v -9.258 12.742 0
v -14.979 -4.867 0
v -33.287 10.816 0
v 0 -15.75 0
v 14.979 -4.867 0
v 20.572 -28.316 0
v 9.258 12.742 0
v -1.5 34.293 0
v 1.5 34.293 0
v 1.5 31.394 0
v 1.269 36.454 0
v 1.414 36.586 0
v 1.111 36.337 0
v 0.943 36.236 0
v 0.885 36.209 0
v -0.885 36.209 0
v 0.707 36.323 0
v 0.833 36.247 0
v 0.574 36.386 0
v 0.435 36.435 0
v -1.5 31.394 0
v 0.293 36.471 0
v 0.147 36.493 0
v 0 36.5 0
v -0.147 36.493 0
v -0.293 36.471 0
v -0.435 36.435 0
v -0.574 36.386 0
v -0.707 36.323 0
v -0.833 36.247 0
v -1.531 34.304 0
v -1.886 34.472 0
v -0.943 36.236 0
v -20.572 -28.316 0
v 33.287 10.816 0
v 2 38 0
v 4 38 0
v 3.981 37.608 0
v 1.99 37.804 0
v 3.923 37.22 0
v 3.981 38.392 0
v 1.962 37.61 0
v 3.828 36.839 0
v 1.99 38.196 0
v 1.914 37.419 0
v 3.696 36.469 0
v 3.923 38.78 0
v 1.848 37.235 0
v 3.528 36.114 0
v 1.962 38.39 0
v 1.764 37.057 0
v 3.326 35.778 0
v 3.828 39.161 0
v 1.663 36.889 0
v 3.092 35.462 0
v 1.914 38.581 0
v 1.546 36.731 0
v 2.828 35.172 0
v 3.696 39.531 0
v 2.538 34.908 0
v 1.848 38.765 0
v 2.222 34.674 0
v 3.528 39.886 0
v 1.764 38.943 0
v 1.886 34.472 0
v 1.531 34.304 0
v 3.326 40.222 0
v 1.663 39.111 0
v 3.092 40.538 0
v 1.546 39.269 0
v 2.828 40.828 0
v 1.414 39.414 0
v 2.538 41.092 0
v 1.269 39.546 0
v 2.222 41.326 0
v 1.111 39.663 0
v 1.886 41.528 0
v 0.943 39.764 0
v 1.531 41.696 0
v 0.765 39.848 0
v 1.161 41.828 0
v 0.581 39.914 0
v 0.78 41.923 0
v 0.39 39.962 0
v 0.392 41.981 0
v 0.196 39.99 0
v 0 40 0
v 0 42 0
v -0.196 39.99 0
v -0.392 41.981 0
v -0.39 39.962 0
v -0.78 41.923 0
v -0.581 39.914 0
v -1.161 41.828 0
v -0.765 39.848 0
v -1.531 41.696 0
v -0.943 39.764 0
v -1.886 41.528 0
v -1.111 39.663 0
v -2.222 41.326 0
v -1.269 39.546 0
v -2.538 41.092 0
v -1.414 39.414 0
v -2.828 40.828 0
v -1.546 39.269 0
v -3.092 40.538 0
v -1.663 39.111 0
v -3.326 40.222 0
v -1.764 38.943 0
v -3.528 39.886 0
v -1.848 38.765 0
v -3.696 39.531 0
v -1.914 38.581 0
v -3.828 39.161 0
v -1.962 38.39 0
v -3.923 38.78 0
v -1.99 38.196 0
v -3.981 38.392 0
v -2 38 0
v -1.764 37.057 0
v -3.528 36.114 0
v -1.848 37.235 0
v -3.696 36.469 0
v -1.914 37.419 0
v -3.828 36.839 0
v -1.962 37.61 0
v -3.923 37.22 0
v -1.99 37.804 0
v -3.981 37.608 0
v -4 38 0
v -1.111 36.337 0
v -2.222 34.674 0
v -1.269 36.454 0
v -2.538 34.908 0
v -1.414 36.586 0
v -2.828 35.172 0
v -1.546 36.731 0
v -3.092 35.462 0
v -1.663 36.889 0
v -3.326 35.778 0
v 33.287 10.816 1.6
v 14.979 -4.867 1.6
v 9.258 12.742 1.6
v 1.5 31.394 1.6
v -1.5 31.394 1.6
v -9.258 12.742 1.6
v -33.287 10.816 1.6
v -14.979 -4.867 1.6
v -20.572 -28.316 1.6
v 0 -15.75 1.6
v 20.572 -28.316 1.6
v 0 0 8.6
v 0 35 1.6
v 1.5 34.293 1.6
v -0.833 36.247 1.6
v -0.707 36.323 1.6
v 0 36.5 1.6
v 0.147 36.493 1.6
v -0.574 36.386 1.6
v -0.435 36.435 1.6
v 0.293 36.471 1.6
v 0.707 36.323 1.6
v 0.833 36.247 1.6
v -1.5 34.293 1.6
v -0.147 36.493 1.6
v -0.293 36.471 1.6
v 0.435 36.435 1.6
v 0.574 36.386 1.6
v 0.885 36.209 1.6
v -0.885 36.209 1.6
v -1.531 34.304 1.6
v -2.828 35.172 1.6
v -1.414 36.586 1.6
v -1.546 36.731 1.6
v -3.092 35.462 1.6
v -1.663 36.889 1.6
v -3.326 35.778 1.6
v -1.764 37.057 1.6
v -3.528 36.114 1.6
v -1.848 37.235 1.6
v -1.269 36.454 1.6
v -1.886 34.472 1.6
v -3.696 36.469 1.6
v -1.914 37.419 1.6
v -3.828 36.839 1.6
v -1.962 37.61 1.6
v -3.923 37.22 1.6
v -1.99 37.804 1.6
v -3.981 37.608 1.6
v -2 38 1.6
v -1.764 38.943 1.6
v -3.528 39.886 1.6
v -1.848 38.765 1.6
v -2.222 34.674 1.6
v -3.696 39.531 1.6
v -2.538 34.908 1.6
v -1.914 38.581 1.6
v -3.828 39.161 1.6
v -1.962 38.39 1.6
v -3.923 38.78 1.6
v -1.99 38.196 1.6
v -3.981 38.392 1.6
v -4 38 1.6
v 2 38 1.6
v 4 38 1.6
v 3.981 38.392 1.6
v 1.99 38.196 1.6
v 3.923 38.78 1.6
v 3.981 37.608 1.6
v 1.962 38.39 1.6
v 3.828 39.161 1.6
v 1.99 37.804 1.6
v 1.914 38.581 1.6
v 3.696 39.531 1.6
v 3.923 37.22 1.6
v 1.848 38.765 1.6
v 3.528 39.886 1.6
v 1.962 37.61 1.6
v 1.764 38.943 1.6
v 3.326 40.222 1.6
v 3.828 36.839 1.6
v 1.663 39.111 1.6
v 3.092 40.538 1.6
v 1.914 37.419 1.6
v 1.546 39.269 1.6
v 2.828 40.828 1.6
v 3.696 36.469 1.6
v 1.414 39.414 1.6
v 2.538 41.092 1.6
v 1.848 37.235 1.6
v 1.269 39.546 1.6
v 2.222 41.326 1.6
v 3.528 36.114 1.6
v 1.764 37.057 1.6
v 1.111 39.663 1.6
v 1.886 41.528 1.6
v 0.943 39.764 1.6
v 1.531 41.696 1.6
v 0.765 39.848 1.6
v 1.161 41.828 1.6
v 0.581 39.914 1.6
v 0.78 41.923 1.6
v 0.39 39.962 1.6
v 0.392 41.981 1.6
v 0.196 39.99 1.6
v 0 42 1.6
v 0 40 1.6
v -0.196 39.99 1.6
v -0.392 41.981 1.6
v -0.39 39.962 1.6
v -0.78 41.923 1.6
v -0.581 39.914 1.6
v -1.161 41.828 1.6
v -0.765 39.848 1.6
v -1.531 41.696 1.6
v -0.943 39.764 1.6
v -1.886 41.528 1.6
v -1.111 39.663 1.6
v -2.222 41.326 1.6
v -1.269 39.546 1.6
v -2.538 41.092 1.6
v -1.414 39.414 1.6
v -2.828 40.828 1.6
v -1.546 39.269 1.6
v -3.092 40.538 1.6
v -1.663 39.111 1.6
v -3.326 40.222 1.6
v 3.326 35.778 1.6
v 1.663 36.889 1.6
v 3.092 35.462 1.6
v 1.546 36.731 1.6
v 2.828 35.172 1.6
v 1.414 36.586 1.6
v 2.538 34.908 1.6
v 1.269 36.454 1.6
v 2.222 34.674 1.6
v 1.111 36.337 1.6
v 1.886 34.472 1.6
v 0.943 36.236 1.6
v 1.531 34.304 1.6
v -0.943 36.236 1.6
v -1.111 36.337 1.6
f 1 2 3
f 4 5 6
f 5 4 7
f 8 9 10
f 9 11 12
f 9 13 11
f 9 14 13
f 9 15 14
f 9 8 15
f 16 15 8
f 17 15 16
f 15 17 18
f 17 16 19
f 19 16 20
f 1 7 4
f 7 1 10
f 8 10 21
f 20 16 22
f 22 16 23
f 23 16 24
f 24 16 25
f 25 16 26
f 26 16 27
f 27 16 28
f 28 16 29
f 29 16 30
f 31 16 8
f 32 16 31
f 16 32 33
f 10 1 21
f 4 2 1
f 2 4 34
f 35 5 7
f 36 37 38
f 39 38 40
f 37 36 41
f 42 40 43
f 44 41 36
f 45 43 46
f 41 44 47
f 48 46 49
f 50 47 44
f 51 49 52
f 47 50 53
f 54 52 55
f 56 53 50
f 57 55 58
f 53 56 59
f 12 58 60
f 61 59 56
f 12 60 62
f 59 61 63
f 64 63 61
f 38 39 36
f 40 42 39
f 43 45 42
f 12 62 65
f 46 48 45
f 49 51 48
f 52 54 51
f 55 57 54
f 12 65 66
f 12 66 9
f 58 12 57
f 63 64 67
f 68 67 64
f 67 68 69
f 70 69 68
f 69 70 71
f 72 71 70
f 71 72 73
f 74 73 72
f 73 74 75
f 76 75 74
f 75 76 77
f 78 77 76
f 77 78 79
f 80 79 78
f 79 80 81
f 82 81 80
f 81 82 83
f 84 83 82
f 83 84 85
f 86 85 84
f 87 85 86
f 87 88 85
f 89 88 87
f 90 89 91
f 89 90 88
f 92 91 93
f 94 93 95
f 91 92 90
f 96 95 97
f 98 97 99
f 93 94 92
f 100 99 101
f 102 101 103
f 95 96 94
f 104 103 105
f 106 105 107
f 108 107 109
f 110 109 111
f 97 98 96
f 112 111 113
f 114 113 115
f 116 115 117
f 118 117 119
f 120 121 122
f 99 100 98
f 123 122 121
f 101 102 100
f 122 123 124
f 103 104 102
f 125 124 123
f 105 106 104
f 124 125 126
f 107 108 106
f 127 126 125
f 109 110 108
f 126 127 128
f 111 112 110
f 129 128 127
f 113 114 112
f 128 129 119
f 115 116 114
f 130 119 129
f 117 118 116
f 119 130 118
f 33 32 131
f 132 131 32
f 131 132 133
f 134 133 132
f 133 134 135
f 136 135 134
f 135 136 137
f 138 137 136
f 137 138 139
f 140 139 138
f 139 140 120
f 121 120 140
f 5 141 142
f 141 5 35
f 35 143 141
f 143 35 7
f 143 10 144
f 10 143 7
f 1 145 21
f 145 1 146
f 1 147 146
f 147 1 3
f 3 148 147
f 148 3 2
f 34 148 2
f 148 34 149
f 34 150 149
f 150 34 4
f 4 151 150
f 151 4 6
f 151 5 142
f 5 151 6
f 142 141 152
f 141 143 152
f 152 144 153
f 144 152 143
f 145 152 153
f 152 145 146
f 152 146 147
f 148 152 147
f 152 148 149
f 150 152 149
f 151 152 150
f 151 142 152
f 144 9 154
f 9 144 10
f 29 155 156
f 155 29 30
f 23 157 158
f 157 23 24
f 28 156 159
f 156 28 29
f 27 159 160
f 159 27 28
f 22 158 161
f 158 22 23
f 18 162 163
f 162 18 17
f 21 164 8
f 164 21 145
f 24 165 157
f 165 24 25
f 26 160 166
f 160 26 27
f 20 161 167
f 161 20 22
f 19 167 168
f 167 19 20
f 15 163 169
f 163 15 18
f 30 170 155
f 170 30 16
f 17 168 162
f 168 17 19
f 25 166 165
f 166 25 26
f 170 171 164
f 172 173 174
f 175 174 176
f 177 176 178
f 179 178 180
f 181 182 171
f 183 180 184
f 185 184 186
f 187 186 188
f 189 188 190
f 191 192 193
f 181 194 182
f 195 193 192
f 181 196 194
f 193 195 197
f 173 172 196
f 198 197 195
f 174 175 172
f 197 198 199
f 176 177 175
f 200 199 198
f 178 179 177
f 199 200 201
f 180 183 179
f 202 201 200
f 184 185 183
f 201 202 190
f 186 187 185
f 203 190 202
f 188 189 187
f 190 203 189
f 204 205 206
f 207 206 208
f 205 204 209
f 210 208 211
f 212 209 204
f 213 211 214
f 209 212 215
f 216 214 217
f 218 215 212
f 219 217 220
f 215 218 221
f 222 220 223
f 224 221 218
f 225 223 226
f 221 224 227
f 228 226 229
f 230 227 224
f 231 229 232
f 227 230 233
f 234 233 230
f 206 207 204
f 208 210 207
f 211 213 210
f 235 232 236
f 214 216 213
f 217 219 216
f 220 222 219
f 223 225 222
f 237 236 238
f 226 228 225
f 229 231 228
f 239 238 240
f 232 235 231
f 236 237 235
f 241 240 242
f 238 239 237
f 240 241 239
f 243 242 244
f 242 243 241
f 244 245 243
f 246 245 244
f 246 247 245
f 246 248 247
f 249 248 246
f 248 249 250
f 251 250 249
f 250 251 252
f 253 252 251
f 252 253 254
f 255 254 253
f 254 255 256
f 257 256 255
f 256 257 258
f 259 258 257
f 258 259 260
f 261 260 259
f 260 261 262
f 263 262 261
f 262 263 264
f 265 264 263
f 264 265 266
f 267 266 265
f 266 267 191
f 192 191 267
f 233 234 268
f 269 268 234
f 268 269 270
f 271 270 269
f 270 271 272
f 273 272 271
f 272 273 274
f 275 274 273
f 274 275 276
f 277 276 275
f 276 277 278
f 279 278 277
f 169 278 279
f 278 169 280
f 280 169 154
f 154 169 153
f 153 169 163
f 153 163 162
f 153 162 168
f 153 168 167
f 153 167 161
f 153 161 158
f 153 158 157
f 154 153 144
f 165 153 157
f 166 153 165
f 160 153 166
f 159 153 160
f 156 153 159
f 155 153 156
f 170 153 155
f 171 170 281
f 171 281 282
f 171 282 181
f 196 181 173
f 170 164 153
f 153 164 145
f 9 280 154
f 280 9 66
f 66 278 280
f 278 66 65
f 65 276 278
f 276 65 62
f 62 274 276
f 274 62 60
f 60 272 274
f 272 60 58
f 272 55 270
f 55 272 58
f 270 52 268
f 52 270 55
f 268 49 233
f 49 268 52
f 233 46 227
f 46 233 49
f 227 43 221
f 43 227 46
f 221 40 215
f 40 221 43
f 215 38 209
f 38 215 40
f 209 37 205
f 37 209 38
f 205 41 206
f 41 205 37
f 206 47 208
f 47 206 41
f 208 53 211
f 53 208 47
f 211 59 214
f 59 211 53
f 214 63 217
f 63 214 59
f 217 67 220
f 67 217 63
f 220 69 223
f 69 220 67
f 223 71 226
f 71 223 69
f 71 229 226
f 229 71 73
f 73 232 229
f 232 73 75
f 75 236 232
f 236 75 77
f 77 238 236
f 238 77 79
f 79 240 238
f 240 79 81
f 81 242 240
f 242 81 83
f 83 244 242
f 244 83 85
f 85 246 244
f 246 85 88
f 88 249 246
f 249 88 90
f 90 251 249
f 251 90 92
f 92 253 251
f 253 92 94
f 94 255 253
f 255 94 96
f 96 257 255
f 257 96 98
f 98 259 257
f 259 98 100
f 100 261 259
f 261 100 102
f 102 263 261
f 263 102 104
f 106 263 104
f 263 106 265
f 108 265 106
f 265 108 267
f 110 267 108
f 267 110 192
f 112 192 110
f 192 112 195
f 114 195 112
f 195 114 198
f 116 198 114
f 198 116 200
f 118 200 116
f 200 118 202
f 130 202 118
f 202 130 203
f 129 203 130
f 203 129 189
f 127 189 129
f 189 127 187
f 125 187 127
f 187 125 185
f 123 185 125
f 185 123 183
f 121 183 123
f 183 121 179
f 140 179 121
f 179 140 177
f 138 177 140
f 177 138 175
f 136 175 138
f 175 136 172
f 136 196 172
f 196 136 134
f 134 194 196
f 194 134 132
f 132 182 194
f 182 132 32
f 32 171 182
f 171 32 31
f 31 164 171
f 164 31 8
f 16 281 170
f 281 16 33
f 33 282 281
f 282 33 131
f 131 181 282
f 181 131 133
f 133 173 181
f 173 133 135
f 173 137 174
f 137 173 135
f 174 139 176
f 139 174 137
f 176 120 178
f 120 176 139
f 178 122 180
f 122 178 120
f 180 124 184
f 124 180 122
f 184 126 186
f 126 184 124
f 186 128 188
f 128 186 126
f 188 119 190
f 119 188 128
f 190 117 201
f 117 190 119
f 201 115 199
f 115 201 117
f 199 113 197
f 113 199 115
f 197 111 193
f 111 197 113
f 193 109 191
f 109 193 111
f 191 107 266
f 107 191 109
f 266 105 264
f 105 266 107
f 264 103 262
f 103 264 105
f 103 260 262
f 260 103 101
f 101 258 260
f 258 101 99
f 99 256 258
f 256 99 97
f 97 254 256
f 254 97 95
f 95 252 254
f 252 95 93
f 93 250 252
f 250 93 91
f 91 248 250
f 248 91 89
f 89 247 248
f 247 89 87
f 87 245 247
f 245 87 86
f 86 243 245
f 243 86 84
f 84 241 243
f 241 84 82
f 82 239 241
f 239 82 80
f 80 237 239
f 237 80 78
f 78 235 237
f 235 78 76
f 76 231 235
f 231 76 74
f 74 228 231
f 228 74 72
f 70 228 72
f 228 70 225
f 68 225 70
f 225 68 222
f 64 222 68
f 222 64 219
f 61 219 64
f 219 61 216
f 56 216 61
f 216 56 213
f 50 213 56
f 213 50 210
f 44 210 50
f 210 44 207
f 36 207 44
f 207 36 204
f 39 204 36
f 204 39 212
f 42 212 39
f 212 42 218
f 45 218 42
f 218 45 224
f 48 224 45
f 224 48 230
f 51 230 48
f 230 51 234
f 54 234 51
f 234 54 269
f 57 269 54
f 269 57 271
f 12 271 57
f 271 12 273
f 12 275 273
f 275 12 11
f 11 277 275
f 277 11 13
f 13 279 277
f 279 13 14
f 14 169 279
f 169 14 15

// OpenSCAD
// Ozdoby choinkowe do druku 3D — parametryczny projekt OpenSCAD.
//
// Wybierz model zmienną `model` (lub w Customizerze OpenSCAD), potem
// F6 (Render) i F7 (Export STL). Z linii poleceń:
//   openscad -D 'model="gwiazda"' -o gwiazda.stl ozdoby.scad
//
// Wszystkie wymiary w milimetrach. Modele leżą płasko na stole
// i drukują się bez podpór.

/* [Wybór modelu] */
model = "gwiazda"; // [gwiazda, platek, choinka, choinka_spiralna, bombka_napis]

/* [Uszko do zawieszenia] */
uszko_srednica = 8;   // zewnętrzna średnica oczka
uszko_scianka  = 2;   // grubość ścianki oczka

/* [Gwiazda] */
gwiazda_ramiona  = 5;
gwiazda_promien  = 35;  // promień do czubka ramienia
gwiazda_wciecie  = 0.45; // promień wewnętrzny jako ułamek promienia
gwiazda_podstawa = 1.6; // grubość płaskiej podstawy
gwiazda_szczyt   = 7;   // wysokość fasetowanego szczytu

/* [Płatek śniegu] */
platek_promien  = 40;
platek_ramie    = 3.2;  // szerokość ramion
platek_grubosc  = 2.4;

/* [Choinka płaska] */
choinka_wysokosc = 75;
choinka_grubosc  = 2.4;
choinka_ozdoby   = 1.2; // wysokość wypukłych bombek (zmiana koloru!)

/* [Choinka spiralna] */
spirala_wysokosc = 70;
spirala_promien  = 22;
spirala_ramiona  = 8;
spirala_skret    = 180; // stopnie skrętu; >200 daje nawisy ponad 45°

/* [Bombka z napisem] */
bombka_promien = 32;
bombka_grubosc = 2.4;
napis_1 = "Wesołych";
napis_2 = "Świąt";
napis_3 = "2026";
napis_wysokosc = 1.2;   // wypukłość napisu i obwódki (zmiana koloru!)
czcionka = "Liberation Sans:style=Bold";

/* [Hidden] */
$fn = 64;

// ---------------------------------------------------------------- pomocnicze

module gwiazda2d(n, r_out, r_in) {
    polygon([for (i = [0 : 2 * n - 1])
        let (a = 90 + i * 180 / n, r = i % 2 == 0 ? r_out : r_in)
        [r * cos(a), r * sin(a)]]);
}

module pasek(p1, p2, w) {
    hull() {
        translate(p1) circle(d = w);
        translate(p2) circle(d = w);
    }
}

// Płaskie oczko; `y` to punkt na brzegu ozdoby, do którego się doczepia.
module uszko_plaskie(y, h) {
    r = uszko_srednica / 2;
    linear_extrude(h)
        translate([0, y + r - uszko_scianka / 2])
            difference() {
                circle(r);
                circle(r - uszko_scianka);
            }
}

// ---------------------------------------------------------------- modele

module gwiazda() {
    r_in = gwiazda_promien * gwiazda_wciecie;
    linear_extrude(gwiazda_podstawa)
        gwiazda2d(gwiazda_ramiona, gwiazda_promien, r_in);
    translate([0, 0, gwiazda_podstawa])
        linear_extrude(gwiazda_szczyt, scale = 0)
            gwiazda2d(gwiazda_ramiona, gwiazda_promien, r_in);
    // czubek ramienia jest ostry — pogrubiamy miejsce styku z oczkiem
    linear_extrude(gwiazda_podstawa)
        pasek([0, gwiazda_promien - 6], [0, gwiazda_promien], 3);
    uszko_plaskie(gwiazda_promien, gwiazda_podstawa);
}

module platek2d() {
    L = platek_promien;
    w = platek_ramie;
    for (k = [0 : 5]) rotate(k * 60) {
        pasek([0, 0], [0, L], w);
        // gałązki: dłuższe bliżej środka, krótsze przy czubku
        for (f = [0.38, 0.62, 0.84]) {
            y = f * L;
            b = (1 - f) * L * 0.75 + 3;
            for (s = [-1, 1])
                pasek([0, y], [s * b * sin(55), y + b * cos(55)], w * 0.85);
        }
        // romb na końcu ramienia
        translate([0, L]) rotate(45) square(w * 1.8, center = true);
    }
    difference() {
        circle(r = L * 0.24, $fn = 6);
        circle(r = L * 0.13, $fn = 6);
    }
}

module platek() {
    linear_extrude(platek_grubosc) platek2d();
    uszko_plaskie(platek_promien + platek_ramie, platek_grubosc);
}

module choinka2d() {
    H = choinka_wysokosc;
    pien_h = H * 0.12;
    pietra = 4;
    korona_h = H - pien_h;
    // pień
    translate([-H * 0.07, 0]) square([H * 0.14, pien_h + 1]);
    // piętra korony — każde to trapez z lekko zadartymi rogami
    for (i = [0 : pietra - 1]) {
        y0 = pien_h + i * korona_h * 0.21;
        szer = H * 0.38 * (1 - i * 0.2);
        gora = i == pietra - 1 ? H : y0 + korona_h * 0.42;
        polygon([[-szer, y0], [szer, y0], [szer * 0.92, y0 + 2],
                 [0, gora], [-szer * 0.92, y0 + 2]]);
    }
}

module choinka() {
    H = choinka_wysokosc;
    linear_extrude(choinka_grubosc) choinka2d();
    // gwiazdka na czubku
    linear_extrude(choinka_grubosc)
        translate([0, H]) gwiazda2d(5, H * 0.09, H * 0.04);
    // wypukłe bombki — od tej warstwy można zmienić filament
    linear_extrude(choinka_grubosc + choinka_ozdoby)
        for (p = [[-0.22, 0.22], [0.18, 0.27], [-0.12, 0.42],
                  [0.14, 0.50], [-0.05, 0.64], [0.07, 0.76]])
            translate([p[0] * H, p[1] * H]) circle(d = H * 0.065);
    uszko_plaskie(H + H * 0.09, choinka_grubosc);
}

module choinka_spiralna() {
    H = spirala_wysokosc;
    linear_extrude(H, twist = -spirala_skret, scale = 0.06, slices = 160)
        gwiazda2d(spirala_ramiona, spirala_promien, spirala_promien * 0.72);
    // pionowe oczko na czubku (małe łuki drukują się bez podpór)
    r = uszko_srednica / 2;
    translate([0, 0, H - 0.6 + r])
        rotate([90, 0, 0])
            rotate_extrude($fn = 48)
                translate([r - uszko_scianka / 2, 0])
                    circle(d = uszko_scianka, $fn = 24);
}

module bombka_napis() {
    R = bombka_promien;
    t = bombka_grubosc;
    nasadka_w = R * 0.42;
    nasadka_h = R * 0.2;
    // korpus bombki z nasadką
    linear_extrude(t) {
        circle(R, $fn = 128);
        translate([-nasadka_w / 2, R - 2]) square([nasadka_w, nasadka_h + 2]);
    }
    // wypukła obwódka, prążki nasadki i napis
    linear_extrude(t + napis_wysokosc) {
        difference() {
            circle(R, $fn = 128);
            circle(R - 2, $fn = 128);
        }
        for (i = [0 : 2])
            translate([-nasadka_w / 2, R + 1 + i * nasadka_h * 0.33])
                square([nasadka_w, 1.2]);
        translate([0, R * 0.30])
            text(napis_1, size = R * 0.24, font = czcionka,
                 halign = "center", valign = "center");
        translate([0, -R * 0.05])
            text(napis_2, size = R * 0.30, font = czcionka,
                 halign = "center", valign = "center");
        translate([0, -R * 0.45])
            text(napis_3, size = R * 0.20, font = czcionka,
                 halign = "center", valign = "center");
    }
    uszko_plaskie(R + nasadka_h, t);
}

if      (model == "gwiazda")          gwiazda();
else if (model == "platek")           platek();
else if (model == "choinka")          choinka();
else if (model == "choinka_spiralna") choinka_spiralna();
else if (model == "bombka_napis")     bombka_napis();
